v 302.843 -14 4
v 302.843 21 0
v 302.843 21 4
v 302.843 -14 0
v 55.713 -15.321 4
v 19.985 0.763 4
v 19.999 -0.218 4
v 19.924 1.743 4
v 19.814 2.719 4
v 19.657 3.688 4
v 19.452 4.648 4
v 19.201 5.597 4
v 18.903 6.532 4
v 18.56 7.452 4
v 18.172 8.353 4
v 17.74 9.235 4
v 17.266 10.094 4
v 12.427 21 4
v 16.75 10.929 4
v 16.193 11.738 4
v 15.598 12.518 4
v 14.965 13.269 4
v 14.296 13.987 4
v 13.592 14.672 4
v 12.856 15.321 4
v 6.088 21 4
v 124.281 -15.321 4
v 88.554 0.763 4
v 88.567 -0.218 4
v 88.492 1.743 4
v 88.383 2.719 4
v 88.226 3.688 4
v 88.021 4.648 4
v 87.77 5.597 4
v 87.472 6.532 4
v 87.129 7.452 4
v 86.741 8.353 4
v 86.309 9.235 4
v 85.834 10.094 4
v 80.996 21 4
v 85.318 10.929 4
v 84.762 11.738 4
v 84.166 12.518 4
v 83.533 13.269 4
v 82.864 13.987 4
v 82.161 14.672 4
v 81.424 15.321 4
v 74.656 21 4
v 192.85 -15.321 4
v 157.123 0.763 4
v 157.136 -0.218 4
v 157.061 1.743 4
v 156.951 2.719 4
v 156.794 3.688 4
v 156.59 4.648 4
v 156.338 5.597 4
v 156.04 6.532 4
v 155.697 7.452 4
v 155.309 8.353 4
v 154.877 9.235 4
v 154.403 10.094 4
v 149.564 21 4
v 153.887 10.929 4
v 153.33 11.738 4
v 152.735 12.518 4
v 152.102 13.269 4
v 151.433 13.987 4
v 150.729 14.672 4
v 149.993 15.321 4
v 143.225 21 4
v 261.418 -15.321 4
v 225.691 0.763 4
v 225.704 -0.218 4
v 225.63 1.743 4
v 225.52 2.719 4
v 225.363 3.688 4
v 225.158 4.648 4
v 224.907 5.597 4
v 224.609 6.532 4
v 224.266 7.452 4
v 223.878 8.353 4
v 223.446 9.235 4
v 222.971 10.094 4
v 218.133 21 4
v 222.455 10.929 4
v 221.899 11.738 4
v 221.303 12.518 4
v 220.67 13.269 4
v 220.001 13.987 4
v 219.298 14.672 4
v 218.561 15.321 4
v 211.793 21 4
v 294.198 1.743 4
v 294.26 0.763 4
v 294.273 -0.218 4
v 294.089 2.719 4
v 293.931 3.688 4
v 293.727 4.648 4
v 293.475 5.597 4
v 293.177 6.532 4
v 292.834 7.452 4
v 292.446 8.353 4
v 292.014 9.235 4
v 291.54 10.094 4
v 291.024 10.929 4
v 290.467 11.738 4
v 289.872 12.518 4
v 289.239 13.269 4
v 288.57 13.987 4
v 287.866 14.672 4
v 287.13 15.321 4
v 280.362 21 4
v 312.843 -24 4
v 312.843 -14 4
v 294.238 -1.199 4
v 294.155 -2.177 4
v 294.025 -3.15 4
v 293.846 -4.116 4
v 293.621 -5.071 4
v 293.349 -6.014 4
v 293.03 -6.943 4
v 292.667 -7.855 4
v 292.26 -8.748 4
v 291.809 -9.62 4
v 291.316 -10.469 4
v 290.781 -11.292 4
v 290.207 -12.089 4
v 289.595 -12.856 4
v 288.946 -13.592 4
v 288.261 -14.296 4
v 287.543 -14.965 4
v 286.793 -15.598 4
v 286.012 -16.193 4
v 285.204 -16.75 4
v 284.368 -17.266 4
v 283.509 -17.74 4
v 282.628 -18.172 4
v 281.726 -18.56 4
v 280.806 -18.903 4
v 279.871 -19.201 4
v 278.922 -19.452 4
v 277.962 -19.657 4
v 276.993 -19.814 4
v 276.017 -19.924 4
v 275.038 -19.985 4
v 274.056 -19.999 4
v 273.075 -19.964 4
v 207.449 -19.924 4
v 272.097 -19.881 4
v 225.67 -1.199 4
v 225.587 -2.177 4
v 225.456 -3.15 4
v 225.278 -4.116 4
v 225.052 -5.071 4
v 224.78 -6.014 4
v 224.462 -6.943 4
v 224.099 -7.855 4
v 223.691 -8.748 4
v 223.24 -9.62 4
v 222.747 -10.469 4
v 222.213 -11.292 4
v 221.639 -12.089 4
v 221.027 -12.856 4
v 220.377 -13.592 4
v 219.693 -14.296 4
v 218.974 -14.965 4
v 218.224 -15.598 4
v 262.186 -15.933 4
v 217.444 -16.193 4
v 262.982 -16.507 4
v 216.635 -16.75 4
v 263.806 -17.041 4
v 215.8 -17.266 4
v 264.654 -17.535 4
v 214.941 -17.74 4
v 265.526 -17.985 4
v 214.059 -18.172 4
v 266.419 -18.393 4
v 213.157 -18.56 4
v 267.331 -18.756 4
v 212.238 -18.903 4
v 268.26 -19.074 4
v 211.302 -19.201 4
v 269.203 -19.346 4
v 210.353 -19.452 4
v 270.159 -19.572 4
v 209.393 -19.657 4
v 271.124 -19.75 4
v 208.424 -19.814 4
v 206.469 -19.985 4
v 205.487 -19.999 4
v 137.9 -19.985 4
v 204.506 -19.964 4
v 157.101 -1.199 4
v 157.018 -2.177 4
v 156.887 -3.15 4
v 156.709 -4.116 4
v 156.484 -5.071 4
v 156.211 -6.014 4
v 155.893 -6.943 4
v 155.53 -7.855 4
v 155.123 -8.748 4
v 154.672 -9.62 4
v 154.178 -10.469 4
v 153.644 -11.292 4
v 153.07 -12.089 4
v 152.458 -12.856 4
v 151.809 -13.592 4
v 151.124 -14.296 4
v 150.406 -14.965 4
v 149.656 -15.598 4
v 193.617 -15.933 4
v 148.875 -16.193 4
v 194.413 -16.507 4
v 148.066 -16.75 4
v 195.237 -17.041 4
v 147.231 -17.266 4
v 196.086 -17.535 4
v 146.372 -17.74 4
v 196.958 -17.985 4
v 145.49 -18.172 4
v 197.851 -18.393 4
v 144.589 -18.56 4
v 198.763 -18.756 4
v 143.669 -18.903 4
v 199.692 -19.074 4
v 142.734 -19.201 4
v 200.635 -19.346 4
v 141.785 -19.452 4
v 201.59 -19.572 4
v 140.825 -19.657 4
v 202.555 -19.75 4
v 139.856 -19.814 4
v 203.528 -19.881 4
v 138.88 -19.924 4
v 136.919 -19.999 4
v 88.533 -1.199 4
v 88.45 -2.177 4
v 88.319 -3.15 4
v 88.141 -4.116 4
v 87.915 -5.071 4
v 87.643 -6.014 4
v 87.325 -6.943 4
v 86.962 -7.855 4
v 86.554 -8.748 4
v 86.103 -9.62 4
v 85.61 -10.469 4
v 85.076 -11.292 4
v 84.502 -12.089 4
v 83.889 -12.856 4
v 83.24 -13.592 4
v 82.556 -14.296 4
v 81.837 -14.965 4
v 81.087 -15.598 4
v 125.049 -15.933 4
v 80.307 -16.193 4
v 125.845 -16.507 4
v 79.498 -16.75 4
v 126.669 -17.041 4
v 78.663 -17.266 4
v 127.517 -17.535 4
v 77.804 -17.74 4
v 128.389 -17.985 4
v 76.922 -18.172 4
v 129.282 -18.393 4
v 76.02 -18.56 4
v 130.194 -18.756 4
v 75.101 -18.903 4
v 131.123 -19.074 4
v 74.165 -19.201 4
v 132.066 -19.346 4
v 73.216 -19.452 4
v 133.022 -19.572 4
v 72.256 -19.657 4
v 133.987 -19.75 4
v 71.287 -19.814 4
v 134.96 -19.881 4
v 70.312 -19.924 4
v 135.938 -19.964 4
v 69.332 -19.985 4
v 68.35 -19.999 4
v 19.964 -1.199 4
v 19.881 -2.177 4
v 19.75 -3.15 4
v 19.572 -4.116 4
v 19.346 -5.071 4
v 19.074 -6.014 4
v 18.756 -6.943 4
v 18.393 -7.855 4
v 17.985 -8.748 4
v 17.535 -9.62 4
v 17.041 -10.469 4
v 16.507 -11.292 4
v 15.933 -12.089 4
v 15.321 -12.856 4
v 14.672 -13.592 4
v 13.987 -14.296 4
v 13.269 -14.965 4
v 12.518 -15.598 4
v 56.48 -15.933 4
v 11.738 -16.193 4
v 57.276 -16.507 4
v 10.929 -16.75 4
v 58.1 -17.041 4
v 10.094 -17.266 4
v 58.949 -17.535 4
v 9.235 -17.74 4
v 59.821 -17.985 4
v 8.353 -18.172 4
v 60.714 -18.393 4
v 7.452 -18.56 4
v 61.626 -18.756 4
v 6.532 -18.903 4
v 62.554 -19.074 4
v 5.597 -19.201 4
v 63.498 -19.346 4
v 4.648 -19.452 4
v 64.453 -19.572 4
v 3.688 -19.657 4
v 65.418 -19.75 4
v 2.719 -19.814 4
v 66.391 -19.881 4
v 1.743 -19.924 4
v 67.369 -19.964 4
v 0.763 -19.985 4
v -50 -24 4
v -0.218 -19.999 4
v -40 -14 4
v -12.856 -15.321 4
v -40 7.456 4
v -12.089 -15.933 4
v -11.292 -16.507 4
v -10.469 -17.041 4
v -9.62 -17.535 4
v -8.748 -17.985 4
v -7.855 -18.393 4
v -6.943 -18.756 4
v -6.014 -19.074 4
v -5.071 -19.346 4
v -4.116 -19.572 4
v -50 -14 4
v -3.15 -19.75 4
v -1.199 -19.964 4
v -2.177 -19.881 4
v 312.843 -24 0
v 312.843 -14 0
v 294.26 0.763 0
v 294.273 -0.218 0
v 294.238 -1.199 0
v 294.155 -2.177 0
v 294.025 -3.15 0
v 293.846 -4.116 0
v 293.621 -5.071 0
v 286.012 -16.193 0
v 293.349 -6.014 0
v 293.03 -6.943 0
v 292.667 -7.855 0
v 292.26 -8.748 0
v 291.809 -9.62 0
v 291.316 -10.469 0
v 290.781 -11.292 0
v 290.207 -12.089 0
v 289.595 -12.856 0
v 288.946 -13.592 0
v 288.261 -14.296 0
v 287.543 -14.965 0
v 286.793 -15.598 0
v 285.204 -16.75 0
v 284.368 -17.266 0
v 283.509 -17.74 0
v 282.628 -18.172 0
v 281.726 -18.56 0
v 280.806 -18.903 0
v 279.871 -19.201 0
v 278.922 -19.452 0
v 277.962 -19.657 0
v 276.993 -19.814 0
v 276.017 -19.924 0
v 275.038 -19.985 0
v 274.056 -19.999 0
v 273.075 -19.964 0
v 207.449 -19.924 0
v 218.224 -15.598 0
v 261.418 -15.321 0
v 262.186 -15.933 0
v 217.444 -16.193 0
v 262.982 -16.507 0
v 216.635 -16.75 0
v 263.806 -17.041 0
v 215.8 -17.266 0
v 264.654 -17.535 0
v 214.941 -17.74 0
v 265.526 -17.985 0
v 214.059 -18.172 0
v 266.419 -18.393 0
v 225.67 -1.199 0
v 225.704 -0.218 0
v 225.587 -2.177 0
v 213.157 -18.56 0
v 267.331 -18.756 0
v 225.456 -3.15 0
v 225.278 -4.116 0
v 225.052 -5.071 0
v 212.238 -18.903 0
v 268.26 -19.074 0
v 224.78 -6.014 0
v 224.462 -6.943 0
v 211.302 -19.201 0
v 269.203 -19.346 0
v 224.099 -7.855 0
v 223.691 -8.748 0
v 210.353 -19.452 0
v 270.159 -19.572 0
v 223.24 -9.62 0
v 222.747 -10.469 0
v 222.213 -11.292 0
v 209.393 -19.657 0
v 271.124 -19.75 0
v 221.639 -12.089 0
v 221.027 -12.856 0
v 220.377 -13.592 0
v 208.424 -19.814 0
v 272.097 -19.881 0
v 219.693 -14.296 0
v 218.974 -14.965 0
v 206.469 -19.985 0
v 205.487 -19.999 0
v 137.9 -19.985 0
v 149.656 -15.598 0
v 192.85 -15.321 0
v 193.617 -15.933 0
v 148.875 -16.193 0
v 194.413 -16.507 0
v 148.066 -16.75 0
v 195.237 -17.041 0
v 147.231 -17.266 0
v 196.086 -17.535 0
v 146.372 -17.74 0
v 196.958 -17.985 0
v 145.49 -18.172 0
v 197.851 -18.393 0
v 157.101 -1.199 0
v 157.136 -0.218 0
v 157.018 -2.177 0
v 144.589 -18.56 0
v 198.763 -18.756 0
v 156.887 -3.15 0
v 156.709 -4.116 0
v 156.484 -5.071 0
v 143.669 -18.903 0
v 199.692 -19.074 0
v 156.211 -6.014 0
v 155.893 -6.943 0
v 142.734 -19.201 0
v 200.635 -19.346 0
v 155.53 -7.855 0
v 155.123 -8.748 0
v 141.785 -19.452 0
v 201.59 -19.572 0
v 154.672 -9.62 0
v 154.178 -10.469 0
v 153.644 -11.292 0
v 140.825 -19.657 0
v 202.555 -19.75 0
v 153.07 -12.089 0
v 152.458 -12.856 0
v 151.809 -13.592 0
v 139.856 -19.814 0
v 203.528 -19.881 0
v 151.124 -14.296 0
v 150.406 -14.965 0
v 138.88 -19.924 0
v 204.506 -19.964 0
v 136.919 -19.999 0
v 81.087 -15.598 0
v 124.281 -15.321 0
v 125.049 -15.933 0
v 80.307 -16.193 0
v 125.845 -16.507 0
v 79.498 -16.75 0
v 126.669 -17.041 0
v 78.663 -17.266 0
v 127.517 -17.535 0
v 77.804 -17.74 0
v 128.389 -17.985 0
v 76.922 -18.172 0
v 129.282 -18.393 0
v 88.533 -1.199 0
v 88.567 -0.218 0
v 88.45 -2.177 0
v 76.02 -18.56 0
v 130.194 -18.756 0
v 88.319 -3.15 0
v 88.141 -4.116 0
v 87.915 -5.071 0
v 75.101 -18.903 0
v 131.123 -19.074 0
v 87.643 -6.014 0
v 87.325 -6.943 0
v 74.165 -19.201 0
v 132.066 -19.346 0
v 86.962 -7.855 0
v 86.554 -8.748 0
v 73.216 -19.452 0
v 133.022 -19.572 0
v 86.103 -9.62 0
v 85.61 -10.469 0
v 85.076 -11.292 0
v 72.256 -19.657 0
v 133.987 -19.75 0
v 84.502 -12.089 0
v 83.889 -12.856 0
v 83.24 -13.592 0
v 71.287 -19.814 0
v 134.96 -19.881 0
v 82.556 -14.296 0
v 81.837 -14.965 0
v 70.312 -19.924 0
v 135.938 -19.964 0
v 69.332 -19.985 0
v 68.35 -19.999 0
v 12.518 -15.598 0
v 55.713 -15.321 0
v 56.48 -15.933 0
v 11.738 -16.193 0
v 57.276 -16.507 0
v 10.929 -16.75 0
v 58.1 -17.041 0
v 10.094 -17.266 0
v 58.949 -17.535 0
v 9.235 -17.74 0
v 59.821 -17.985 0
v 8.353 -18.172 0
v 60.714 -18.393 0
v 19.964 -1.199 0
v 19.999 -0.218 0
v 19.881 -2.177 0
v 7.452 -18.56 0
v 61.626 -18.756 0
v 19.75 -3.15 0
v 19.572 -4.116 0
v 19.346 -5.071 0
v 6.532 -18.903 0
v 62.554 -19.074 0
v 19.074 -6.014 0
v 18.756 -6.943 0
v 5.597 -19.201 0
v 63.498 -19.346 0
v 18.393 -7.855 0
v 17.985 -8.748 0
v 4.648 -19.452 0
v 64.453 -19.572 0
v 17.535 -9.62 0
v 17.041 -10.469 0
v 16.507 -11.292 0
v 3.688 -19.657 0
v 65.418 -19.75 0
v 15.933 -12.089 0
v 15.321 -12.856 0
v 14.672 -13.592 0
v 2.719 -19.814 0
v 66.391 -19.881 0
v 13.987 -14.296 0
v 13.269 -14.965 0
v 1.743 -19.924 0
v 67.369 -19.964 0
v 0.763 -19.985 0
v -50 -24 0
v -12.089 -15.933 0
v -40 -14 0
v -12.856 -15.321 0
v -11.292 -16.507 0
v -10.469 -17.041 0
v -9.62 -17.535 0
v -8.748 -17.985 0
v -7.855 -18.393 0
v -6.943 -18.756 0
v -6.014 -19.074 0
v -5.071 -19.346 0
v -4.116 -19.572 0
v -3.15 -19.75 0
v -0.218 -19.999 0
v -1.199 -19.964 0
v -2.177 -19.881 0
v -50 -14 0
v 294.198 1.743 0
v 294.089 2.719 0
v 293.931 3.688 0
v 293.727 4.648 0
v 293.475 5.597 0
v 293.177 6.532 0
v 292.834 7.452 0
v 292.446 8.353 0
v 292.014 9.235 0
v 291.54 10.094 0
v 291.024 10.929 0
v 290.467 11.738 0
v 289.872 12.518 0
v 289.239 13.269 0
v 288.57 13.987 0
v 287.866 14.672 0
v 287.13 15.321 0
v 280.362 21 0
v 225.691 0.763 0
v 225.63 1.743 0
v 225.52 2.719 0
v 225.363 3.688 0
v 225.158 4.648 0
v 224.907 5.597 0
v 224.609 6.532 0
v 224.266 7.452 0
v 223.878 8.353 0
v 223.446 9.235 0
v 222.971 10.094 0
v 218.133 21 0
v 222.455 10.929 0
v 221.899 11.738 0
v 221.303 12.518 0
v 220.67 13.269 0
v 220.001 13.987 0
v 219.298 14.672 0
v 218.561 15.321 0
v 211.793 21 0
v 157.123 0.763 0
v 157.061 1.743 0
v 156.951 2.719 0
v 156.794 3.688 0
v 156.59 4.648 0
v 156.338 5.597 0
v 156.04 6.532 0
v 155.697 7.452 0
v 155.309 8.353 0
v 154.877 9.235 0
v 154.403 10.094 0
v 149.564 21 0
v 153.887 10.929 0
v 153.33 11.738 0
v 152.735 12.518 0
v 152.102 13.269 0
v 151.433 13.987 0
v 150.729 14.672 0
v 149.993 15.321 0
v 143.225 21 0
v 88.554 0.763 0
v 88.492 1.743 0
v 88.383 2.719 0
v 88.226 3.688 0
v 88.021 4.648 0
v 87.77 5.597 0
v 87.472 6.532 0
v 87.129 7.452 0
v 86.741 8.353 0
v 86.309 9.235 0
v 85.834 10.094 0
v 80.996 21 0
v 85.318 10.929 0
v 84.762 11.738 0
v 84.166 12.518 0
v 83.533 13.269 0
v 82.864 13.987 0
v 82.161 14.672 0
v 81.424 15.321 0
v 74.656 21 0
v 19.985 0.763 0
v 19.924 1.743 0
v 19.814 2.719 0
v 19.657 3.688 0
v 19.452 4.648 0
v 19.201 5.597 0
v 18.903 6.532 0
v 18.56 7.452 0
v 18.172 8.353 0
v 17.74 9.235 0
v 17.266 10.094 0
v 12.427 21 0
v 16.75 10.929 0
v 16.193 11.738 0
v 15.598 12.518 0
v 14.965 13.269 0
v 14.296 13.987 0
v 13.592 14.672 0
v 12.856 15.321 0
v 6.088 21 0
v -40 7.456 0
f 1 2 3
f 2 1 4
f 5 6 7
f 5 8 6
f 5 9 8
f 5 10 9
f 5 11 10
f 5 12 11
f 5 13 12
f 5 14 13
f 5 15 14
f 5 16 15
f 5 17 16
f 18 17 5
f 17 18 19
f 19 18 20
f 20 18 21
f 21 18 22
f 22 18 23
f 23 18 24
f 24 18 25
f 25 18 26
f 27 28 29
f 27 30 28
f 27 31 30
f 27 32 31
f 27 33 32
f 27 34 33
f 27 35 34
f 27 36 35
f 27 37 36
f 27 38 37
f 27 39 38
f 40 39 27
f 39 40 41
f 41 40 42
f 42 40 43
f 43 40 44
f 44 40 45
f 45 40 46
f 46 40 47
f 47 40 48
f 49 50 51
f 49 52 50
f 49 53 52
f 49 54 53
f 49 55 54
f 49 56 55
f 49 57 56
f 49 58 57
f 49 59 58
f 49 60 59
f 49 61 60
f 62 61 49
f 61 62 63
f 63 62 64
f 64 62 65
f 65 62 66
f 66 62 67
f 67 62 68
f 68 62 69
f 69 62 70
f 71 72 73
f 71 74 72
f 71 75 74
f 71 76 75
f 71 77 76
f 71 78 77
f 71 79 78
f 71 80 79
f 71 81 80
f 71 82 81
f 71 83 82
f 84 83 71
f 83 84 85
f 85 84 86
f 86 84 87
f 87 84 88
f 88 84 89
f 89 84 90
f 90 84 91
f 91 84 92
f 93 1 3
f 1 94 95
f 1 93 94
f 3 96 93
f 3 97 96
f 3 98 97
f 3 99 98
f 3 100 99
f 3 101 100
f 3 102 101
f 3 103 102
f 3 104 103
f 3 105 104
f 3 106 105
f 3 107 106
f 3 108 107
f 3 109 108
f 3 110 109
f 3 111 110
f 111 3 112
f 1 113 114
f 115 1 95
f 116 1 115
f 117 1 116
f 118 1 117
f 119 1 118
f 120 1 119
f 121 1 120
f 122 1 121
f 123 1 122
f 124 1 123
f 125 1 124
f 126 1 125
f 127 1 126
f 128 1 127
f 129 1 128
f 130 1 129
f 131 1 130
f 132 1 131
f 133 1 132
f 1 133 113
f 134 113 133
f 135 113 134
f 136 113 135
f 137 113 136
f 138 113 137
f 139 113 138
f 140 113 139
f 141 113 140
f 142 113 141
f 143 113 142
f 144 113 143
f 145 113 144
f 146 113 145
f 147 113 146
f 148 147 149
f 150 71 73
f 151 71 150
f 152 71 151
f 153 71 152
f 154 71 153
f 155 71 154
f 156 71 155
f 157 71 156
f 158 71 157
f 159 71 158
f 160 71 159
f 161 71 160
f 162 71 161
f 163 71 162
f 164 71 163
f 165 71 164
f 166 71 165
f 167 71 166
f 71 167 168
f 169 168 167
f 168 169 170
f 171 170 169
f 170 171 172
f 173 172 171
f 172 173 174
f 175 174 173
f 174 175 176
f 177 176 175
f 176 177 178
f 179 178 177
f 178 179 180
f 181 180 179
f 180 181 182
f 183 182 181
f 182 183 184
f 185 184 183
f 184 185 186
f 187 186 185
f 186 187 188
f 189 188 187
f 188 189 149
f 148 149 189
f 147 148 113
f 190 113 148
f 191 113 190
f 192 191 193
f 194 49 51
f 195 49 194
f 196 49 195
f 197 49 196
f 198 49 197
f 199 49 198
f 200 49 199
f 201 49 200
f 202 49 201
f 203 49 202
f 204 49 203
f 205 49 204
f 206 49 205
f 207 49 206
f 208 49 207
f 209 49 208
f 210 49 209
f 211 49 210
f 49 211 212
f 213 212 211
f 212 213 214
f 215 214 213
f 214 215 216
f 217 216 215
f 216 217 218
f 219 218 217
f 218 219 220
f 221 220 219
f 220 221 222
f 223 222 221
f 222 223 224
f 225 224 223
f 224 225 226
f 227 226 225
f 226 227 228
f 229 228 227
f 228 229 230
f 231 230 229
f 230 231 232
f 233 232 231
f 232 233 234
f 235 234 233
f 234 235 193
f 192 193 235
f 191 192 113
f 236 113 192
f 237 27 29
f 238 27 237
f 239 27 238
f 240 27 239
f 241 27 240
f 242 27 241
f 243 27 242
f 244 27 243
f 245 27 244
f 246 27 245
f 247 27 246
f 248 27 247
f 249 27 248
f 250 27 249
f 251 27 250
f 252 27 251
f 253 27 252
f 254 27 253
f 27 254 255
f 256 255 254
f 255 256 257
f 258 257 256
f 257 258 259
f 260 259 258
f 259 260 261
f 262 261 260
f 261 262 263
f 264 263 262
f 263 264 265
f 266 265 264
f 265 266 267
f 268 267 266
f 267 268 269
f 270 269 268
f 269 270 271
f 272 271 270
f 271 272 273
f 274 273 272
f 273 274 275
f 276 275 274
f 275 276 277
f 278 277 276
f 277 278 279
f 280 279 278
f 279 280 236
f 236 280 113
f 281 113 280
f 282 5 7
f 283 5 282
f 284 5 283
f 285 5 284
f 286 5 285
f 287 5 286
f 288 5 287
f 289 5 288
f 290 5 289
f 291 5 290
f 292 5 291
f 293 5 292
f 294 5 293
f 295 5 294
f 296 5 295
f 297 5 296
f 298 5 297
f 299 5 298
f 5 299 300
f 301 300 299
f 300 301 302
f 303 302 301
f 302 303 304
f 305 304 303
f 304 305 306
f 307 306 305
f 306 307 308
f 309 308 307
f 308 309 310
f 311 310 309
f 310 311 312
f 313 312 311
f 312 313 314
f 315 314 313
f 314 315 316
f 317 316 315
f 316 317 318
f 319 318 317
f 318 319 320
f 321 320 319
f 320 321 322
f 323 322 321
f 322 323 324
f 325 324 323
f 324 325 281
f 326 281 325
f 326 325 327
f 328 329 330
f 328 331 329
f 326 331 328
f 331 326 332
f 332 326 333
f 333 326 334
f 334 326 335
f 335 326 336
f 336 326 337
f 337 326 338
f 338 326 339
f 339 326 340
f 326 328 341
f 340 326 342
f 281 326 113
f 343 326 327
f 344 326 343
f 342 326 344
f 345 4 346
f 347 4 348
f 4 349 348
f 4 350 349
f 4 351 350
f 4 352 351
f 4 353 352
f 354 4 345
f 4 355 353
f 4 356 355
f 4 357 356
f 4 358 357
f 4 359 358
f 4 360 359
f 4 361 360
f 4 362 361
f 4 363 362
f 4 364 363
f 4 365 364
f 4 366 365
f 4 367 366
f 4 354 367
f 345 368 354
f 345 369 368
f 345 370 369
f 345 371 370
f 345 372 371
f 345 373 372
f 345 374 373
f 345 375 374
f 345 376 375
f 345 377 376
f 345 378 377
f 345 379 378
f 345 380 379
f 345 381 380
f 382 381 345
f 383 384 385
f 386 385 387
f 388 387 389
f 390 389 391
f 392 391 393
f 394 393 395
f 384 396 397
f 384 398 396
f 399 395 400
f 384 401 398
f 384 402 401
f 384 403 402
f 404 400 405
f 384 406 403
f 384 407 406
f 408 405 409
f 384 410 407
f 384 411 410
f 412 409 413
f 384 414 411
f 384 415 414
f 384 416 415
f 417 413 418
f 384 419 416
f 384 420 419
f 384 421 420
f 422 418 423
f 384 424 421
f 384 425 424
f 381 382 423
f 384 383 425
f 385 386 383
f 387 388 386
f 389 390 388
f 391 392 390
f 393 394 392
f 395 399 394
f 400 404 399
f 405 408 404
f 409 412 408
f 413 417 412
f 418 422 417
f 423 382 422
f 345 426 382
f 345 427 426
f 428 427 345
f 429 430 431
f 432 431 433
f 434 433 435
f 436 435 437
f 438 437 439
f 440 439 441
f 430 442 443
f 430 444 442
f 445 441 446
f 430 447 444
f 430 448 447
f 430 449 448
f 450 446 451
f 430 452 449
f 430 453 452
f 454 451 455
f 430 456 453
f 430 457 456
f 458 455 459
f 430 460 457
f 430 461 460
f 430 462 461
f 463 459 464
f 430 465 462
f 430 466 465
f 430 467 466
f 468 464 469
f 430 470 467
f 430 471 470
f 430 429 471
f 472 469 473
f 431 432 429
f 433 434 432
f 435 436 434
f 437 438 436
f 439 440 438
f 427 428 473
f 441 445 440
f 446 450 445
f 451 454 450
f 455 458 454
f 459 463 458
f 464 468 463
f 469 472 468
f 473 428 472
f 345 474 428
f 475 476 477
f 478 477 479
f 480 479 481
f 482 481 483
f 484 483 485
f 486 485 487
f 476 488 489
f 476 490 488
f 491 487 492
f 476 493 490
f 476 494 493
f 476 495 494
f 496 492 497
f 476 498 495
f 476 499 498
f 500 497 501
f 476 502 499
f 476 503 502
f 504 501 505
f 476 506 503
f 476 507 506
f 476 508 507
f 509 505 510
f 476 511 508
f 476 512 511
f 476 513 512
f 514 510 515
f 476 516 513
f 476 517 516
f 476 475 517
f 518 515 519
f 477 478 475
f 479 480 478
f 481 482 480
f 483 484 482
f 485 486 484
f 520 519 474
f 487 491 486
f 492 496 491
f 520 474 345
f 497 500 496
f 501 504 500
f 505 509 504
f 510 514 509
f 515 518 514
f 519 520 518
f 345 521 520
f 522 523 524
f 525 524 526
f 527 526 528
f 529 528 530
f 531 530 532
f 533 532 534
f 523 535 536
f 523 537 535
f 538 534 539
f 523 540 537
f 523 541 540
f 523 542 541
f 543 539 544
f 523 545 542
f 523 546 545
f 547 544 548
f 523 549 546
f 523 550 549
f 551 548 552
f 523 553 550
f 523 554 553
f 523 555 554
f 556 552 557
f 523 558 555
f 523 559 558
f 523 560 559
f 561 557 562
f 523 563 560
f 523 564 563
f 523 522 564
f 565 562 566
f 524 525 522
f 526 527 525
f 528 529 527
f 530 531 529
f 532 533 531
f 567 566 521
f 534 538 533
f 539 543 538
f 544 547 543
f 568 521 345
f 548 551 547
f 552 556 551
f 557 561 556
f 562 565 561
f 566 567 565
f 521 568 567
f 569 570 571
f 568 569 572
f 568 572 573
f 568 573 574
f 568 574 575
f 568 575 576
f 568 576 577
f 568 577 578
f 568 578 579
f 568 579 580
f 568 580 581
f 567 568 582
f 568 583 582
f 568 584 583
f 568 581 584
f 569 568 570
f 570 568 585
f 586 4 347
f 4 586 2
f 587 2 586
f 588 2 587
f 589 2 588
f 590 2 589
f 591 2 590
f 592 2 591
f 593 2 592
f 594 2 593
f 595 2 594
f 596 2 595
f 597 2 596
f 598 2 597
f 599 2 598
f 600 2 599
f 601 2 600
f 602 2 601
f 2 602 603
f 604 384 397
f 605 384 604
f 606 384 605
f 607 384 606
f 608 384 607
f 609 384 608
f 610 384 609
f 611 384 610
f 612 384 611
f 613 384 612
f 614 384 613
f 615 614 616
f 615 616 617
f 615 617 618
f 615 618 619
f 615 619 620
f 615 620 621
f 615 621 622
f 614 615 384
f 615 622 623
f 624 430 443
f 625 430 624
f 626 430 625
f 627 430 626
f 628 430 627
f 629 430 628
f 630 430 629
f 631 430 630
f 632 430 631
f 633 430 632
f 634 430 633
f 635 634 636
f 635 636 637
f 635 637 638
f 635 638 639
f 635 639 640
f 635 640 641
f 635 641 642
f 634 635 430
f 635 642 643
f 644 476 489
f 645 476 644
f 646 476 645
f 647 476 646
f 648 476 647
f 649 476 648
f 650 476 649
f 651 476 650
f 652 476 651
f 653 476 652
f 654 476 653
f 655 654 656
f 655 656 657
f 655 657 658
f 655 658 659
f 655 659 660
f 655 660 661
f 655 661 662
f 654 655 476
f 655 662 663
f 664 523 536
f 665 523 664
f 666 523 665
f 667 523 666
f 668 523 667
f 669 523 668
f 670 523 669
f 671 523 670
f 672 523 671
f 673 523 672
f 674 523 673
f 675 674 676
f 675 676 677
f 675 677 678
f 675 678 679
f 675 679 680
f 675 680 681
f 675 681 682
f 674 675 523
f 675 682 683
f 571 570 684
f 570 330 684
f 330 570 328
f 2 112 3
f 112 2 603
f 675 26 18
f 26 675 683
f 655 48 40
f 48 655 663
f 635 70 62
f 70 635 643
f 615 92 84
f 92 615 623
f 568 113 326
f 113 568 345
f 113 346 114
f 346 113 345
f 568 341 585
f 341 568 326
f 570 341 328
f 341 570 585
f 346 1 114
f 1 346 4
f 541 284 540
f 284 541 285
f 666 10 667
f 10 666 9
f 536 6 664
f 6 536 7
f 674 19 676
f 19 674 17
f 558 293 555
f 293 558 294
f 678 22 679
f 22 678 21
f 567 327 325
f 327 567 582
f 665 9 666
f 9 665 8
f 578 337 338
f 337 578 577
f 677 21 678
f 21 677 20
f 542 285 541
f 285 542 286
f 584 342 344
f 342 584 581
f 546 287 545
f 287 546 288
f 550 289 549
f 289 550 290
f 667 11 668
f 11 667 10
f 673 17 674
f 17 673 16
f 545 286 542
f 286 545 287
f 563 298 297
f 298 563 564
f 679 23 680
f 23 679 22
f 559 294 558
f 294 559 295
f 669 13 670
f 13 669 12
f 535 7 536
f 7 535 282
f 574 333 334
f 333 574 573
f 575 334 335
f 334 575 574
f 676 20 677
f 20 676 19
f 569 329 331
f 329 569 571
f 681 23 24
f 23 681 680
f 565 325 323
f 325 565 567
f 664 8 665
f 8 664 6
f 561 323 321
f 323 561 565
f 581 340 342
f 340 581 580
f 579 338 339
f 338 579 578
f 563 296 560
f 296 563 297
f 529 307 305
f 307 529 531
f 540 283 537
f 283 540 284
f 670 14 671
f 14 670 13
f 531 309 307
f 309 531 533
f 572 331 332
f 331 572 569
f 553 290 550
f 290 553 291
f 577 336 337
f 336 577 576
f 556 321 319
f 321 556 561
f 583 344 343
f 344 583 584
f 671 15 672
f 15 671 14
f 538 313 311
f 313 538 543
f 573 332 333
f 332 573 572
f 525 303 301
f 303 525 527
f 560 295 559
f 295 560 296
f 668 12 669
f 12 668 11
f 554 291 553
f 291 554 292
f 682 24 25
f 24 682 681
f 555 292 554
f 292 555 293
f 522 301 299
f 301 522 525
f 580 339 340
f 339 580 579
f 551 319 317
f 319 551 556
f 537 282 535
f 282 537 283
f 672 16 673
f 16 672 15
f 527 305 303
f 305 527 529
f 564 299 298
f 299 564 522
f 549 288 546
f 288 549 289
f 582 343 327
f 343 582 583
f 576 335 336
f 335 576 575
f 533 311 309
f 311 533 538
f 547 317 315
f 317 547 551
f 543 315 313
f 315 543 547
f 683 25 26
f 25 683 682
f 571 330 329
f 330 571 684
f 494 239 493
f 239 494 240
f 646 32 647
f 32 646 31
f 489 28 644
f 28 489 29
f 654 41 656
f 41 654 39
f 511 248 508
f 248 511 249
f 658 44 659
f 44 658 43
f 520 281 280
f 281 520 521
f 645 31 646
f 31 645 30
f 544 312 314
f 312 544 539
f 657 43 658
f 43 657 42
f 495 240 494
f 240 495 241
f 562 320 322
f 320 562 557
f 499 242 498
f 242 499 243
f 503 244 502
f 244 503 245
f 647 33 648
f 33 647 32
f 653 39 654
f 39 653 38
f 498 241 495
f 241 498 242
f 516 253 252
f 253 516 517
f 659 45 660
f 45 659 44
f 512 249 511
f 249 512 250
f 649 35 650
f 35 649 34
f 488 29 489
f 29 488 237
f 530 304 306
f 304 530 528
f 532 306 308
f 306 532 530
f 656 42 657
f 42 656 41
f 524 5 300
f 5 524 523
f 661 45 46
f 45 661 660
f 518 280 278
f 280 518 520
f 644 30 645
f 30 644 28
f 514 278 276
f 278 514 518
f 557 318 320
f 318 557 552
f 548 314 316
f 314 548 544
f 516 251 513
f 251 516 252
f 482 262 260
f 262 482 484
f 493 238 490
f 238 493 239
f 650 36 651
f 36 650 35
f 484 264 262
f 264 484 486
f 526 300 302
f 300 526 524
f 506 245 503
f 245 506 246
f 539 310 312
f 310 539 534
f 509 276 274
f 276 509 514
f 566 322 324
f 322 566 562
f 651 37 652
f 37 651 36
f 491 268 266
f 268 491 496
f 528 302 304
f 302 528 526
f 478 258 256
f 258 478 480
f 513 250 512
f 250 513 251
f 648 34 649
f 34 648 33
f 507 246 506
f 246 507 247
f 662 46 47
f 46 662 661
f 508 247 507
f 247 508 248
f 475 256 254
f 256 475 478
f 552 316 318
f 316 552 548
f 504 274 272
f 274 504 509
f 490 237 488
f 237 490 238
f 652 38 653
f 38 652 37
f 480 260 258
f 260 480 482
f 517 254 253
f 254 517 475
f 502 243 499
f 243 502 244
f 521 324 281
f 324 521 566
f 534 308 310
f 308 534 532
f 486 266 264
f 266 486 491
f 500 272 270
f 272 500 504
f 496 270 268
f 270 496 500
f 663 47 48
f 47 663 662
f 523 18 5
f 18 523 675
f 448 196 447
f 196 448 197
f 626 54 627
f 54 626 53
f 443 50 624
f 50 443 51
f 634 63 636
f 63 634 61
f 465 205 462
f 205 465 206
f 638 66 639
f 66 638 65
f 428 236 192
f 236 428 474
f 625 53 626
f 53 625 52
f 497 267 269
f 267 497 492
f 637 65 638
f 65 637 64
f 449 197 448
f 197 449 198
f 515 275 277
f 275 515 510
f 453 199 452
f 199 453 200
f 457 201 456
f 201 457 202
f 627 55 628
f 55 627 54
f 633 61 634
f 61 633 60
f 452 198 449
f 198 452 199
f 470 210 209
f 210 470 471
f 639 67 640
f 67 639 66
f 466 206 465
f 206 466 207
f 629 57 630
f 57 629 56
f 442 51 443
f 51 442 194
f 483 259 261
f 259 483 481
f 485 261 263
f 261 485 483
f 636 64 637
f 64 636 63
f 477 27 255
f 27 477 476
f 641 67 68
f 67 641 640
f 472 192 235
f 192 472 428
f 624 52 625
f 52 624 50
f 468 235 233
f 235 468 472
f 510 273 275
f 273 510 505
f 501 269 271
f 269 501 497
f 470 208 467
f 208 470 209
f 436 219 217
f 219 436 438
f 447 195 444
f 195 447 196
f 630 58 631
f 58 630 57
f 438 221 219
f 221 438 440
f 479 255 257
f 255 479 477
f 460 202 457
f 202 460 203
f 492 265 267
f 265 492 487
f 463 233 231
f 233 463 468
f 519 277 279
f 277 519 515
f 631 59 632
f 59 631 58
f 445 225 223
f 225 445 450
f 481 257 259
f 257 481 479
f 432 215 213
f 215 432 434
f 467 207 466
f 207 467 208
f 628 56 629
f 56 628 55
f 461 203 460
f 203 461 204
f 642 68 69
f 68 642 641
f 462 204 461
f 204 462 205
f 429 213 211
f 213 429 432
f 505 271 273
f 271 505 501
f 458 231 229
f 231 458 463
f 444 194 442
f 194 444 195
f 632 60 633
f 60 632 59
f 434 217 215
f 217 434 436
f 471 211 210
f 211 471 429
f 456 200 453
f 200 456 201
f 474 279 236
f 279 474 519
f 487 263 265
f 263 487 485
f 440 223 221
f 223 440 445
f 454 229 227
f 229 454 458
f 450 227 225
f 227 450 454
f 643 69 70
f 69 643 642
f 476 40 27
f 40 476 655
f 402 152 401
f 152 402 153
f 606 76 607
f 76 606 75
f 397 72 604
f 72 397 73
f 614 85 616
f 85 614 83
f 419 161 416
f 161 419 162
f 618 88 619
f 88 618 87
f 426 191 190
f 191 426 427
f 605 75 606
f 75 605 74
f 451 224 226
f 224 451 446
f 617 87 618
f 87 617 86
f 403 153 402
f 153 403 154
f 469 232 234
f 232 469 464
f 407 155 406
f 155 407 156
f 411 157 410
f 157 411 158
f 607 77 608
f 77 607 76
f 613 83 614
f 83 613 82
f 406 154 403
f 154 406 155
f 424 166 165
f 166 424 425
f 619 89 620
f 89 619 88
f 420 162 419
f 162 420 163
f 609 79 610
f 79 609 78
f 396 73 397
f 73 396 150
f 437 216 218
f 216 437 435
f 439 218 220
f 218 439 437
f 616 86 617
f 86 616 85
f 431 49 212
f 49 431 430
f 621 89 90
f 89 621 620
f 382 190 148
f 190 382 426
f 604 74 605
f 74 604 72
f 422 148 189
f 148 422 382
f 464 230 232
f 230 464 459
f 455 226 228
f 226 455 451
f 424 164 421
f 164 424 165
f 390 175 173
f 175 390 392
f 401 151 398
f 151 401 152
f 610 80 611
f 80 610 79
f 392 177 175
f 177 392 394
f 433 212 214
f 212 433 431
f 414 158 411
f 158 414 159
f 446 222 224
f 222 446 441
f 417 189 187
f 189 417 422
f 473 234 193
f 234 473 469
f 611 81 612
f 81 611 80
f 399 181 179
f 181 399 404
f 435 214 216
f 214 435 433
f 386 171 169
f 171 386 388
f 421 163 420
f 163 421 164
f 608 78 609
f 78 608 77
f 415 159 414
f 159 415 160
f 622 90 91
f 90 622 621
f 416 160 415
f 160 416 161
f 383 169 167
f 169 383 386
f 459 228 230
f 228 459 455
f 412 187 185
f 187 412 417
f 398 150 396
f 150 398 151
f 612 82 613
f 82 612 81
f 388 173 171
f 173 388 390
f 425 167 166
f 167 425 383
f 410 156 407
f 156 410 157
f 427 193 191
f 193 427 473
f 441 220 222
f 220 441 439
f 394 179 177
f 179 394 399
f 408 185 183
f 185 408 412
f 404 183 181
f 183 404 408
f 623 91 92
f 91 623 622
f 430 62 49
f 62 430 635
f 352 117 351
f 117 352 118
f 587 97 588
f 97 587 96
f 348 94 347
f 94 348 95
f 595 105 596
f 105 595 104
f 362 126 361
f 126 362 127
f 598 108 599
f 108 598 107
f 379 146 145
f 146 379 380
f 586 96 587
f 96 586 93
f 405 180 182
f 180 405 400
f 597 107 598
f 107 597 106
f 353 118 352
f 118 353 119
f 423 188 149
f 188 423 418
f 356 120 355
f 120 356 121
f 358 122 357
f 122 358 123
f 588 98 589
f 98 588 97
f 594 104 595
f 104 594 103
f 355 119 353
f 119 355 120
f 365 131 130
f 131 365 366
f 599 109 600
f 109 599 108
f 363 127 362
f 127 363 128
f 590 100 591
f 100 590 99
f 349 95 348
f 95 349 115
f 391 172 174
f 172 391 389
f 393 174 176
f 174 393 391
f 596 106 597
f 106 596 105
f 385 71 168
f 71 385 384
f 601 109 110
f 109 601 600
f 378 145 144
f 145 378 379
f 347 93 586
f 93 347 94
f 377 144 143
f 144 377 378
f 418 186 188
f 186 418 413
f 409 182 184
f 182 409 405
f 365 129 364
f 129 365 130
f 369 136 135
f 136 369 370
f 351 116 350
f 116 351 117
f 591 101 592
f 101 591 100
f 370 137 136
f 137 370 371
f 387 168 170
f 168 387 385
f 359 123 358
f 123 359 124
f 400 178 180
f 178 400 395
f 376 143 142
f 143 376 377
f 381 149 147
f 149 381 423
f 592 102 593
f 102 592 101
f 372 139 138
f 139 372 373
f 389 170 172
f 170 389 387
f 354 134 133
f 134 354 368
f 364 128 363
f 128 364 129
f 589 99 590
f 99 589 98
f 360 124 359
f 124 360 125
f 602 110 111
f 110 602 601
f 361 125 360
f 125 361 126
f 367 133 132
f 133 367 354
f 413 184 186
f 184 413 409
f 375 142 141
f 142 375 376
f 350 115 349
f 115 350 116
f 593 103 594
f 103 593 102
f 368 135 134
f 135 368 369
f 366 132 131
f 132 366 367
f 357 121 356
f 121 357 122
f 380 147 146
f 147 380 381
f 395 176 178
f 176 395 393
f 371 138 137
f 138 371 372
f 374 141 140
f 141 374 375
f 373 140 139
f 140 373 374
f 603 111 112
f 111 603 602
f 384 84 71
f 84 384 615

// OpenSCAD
$fn=128;

hr=20;
t=4;

hd=sqrt(2)*hr*2+t*3;

difference() {
  union() { 
    translate([-hr*2,-hr-t,0]) cube([hd*5,45,t]);
    translate([-hr*2-10,-hr-t,0]) cube([hd*5+20,10,t]);
  }
  holes();
}


module holes() {
  translate([0,0,0]) hole();
  translate([hd,0,0]) hole();
  translate([hd*2,0,0]) hole();
  translate([hd*3,0,0]) hole();
  translate([hd*4,0,0]) hole();
}


module hole() translate([0,0,-1]) rotate([0,0,50]) {
  cylinder(r=hr,h=t+2);
  translate([-hr,0,0]) cube([hr*2,hr*4,t+2]);
}
